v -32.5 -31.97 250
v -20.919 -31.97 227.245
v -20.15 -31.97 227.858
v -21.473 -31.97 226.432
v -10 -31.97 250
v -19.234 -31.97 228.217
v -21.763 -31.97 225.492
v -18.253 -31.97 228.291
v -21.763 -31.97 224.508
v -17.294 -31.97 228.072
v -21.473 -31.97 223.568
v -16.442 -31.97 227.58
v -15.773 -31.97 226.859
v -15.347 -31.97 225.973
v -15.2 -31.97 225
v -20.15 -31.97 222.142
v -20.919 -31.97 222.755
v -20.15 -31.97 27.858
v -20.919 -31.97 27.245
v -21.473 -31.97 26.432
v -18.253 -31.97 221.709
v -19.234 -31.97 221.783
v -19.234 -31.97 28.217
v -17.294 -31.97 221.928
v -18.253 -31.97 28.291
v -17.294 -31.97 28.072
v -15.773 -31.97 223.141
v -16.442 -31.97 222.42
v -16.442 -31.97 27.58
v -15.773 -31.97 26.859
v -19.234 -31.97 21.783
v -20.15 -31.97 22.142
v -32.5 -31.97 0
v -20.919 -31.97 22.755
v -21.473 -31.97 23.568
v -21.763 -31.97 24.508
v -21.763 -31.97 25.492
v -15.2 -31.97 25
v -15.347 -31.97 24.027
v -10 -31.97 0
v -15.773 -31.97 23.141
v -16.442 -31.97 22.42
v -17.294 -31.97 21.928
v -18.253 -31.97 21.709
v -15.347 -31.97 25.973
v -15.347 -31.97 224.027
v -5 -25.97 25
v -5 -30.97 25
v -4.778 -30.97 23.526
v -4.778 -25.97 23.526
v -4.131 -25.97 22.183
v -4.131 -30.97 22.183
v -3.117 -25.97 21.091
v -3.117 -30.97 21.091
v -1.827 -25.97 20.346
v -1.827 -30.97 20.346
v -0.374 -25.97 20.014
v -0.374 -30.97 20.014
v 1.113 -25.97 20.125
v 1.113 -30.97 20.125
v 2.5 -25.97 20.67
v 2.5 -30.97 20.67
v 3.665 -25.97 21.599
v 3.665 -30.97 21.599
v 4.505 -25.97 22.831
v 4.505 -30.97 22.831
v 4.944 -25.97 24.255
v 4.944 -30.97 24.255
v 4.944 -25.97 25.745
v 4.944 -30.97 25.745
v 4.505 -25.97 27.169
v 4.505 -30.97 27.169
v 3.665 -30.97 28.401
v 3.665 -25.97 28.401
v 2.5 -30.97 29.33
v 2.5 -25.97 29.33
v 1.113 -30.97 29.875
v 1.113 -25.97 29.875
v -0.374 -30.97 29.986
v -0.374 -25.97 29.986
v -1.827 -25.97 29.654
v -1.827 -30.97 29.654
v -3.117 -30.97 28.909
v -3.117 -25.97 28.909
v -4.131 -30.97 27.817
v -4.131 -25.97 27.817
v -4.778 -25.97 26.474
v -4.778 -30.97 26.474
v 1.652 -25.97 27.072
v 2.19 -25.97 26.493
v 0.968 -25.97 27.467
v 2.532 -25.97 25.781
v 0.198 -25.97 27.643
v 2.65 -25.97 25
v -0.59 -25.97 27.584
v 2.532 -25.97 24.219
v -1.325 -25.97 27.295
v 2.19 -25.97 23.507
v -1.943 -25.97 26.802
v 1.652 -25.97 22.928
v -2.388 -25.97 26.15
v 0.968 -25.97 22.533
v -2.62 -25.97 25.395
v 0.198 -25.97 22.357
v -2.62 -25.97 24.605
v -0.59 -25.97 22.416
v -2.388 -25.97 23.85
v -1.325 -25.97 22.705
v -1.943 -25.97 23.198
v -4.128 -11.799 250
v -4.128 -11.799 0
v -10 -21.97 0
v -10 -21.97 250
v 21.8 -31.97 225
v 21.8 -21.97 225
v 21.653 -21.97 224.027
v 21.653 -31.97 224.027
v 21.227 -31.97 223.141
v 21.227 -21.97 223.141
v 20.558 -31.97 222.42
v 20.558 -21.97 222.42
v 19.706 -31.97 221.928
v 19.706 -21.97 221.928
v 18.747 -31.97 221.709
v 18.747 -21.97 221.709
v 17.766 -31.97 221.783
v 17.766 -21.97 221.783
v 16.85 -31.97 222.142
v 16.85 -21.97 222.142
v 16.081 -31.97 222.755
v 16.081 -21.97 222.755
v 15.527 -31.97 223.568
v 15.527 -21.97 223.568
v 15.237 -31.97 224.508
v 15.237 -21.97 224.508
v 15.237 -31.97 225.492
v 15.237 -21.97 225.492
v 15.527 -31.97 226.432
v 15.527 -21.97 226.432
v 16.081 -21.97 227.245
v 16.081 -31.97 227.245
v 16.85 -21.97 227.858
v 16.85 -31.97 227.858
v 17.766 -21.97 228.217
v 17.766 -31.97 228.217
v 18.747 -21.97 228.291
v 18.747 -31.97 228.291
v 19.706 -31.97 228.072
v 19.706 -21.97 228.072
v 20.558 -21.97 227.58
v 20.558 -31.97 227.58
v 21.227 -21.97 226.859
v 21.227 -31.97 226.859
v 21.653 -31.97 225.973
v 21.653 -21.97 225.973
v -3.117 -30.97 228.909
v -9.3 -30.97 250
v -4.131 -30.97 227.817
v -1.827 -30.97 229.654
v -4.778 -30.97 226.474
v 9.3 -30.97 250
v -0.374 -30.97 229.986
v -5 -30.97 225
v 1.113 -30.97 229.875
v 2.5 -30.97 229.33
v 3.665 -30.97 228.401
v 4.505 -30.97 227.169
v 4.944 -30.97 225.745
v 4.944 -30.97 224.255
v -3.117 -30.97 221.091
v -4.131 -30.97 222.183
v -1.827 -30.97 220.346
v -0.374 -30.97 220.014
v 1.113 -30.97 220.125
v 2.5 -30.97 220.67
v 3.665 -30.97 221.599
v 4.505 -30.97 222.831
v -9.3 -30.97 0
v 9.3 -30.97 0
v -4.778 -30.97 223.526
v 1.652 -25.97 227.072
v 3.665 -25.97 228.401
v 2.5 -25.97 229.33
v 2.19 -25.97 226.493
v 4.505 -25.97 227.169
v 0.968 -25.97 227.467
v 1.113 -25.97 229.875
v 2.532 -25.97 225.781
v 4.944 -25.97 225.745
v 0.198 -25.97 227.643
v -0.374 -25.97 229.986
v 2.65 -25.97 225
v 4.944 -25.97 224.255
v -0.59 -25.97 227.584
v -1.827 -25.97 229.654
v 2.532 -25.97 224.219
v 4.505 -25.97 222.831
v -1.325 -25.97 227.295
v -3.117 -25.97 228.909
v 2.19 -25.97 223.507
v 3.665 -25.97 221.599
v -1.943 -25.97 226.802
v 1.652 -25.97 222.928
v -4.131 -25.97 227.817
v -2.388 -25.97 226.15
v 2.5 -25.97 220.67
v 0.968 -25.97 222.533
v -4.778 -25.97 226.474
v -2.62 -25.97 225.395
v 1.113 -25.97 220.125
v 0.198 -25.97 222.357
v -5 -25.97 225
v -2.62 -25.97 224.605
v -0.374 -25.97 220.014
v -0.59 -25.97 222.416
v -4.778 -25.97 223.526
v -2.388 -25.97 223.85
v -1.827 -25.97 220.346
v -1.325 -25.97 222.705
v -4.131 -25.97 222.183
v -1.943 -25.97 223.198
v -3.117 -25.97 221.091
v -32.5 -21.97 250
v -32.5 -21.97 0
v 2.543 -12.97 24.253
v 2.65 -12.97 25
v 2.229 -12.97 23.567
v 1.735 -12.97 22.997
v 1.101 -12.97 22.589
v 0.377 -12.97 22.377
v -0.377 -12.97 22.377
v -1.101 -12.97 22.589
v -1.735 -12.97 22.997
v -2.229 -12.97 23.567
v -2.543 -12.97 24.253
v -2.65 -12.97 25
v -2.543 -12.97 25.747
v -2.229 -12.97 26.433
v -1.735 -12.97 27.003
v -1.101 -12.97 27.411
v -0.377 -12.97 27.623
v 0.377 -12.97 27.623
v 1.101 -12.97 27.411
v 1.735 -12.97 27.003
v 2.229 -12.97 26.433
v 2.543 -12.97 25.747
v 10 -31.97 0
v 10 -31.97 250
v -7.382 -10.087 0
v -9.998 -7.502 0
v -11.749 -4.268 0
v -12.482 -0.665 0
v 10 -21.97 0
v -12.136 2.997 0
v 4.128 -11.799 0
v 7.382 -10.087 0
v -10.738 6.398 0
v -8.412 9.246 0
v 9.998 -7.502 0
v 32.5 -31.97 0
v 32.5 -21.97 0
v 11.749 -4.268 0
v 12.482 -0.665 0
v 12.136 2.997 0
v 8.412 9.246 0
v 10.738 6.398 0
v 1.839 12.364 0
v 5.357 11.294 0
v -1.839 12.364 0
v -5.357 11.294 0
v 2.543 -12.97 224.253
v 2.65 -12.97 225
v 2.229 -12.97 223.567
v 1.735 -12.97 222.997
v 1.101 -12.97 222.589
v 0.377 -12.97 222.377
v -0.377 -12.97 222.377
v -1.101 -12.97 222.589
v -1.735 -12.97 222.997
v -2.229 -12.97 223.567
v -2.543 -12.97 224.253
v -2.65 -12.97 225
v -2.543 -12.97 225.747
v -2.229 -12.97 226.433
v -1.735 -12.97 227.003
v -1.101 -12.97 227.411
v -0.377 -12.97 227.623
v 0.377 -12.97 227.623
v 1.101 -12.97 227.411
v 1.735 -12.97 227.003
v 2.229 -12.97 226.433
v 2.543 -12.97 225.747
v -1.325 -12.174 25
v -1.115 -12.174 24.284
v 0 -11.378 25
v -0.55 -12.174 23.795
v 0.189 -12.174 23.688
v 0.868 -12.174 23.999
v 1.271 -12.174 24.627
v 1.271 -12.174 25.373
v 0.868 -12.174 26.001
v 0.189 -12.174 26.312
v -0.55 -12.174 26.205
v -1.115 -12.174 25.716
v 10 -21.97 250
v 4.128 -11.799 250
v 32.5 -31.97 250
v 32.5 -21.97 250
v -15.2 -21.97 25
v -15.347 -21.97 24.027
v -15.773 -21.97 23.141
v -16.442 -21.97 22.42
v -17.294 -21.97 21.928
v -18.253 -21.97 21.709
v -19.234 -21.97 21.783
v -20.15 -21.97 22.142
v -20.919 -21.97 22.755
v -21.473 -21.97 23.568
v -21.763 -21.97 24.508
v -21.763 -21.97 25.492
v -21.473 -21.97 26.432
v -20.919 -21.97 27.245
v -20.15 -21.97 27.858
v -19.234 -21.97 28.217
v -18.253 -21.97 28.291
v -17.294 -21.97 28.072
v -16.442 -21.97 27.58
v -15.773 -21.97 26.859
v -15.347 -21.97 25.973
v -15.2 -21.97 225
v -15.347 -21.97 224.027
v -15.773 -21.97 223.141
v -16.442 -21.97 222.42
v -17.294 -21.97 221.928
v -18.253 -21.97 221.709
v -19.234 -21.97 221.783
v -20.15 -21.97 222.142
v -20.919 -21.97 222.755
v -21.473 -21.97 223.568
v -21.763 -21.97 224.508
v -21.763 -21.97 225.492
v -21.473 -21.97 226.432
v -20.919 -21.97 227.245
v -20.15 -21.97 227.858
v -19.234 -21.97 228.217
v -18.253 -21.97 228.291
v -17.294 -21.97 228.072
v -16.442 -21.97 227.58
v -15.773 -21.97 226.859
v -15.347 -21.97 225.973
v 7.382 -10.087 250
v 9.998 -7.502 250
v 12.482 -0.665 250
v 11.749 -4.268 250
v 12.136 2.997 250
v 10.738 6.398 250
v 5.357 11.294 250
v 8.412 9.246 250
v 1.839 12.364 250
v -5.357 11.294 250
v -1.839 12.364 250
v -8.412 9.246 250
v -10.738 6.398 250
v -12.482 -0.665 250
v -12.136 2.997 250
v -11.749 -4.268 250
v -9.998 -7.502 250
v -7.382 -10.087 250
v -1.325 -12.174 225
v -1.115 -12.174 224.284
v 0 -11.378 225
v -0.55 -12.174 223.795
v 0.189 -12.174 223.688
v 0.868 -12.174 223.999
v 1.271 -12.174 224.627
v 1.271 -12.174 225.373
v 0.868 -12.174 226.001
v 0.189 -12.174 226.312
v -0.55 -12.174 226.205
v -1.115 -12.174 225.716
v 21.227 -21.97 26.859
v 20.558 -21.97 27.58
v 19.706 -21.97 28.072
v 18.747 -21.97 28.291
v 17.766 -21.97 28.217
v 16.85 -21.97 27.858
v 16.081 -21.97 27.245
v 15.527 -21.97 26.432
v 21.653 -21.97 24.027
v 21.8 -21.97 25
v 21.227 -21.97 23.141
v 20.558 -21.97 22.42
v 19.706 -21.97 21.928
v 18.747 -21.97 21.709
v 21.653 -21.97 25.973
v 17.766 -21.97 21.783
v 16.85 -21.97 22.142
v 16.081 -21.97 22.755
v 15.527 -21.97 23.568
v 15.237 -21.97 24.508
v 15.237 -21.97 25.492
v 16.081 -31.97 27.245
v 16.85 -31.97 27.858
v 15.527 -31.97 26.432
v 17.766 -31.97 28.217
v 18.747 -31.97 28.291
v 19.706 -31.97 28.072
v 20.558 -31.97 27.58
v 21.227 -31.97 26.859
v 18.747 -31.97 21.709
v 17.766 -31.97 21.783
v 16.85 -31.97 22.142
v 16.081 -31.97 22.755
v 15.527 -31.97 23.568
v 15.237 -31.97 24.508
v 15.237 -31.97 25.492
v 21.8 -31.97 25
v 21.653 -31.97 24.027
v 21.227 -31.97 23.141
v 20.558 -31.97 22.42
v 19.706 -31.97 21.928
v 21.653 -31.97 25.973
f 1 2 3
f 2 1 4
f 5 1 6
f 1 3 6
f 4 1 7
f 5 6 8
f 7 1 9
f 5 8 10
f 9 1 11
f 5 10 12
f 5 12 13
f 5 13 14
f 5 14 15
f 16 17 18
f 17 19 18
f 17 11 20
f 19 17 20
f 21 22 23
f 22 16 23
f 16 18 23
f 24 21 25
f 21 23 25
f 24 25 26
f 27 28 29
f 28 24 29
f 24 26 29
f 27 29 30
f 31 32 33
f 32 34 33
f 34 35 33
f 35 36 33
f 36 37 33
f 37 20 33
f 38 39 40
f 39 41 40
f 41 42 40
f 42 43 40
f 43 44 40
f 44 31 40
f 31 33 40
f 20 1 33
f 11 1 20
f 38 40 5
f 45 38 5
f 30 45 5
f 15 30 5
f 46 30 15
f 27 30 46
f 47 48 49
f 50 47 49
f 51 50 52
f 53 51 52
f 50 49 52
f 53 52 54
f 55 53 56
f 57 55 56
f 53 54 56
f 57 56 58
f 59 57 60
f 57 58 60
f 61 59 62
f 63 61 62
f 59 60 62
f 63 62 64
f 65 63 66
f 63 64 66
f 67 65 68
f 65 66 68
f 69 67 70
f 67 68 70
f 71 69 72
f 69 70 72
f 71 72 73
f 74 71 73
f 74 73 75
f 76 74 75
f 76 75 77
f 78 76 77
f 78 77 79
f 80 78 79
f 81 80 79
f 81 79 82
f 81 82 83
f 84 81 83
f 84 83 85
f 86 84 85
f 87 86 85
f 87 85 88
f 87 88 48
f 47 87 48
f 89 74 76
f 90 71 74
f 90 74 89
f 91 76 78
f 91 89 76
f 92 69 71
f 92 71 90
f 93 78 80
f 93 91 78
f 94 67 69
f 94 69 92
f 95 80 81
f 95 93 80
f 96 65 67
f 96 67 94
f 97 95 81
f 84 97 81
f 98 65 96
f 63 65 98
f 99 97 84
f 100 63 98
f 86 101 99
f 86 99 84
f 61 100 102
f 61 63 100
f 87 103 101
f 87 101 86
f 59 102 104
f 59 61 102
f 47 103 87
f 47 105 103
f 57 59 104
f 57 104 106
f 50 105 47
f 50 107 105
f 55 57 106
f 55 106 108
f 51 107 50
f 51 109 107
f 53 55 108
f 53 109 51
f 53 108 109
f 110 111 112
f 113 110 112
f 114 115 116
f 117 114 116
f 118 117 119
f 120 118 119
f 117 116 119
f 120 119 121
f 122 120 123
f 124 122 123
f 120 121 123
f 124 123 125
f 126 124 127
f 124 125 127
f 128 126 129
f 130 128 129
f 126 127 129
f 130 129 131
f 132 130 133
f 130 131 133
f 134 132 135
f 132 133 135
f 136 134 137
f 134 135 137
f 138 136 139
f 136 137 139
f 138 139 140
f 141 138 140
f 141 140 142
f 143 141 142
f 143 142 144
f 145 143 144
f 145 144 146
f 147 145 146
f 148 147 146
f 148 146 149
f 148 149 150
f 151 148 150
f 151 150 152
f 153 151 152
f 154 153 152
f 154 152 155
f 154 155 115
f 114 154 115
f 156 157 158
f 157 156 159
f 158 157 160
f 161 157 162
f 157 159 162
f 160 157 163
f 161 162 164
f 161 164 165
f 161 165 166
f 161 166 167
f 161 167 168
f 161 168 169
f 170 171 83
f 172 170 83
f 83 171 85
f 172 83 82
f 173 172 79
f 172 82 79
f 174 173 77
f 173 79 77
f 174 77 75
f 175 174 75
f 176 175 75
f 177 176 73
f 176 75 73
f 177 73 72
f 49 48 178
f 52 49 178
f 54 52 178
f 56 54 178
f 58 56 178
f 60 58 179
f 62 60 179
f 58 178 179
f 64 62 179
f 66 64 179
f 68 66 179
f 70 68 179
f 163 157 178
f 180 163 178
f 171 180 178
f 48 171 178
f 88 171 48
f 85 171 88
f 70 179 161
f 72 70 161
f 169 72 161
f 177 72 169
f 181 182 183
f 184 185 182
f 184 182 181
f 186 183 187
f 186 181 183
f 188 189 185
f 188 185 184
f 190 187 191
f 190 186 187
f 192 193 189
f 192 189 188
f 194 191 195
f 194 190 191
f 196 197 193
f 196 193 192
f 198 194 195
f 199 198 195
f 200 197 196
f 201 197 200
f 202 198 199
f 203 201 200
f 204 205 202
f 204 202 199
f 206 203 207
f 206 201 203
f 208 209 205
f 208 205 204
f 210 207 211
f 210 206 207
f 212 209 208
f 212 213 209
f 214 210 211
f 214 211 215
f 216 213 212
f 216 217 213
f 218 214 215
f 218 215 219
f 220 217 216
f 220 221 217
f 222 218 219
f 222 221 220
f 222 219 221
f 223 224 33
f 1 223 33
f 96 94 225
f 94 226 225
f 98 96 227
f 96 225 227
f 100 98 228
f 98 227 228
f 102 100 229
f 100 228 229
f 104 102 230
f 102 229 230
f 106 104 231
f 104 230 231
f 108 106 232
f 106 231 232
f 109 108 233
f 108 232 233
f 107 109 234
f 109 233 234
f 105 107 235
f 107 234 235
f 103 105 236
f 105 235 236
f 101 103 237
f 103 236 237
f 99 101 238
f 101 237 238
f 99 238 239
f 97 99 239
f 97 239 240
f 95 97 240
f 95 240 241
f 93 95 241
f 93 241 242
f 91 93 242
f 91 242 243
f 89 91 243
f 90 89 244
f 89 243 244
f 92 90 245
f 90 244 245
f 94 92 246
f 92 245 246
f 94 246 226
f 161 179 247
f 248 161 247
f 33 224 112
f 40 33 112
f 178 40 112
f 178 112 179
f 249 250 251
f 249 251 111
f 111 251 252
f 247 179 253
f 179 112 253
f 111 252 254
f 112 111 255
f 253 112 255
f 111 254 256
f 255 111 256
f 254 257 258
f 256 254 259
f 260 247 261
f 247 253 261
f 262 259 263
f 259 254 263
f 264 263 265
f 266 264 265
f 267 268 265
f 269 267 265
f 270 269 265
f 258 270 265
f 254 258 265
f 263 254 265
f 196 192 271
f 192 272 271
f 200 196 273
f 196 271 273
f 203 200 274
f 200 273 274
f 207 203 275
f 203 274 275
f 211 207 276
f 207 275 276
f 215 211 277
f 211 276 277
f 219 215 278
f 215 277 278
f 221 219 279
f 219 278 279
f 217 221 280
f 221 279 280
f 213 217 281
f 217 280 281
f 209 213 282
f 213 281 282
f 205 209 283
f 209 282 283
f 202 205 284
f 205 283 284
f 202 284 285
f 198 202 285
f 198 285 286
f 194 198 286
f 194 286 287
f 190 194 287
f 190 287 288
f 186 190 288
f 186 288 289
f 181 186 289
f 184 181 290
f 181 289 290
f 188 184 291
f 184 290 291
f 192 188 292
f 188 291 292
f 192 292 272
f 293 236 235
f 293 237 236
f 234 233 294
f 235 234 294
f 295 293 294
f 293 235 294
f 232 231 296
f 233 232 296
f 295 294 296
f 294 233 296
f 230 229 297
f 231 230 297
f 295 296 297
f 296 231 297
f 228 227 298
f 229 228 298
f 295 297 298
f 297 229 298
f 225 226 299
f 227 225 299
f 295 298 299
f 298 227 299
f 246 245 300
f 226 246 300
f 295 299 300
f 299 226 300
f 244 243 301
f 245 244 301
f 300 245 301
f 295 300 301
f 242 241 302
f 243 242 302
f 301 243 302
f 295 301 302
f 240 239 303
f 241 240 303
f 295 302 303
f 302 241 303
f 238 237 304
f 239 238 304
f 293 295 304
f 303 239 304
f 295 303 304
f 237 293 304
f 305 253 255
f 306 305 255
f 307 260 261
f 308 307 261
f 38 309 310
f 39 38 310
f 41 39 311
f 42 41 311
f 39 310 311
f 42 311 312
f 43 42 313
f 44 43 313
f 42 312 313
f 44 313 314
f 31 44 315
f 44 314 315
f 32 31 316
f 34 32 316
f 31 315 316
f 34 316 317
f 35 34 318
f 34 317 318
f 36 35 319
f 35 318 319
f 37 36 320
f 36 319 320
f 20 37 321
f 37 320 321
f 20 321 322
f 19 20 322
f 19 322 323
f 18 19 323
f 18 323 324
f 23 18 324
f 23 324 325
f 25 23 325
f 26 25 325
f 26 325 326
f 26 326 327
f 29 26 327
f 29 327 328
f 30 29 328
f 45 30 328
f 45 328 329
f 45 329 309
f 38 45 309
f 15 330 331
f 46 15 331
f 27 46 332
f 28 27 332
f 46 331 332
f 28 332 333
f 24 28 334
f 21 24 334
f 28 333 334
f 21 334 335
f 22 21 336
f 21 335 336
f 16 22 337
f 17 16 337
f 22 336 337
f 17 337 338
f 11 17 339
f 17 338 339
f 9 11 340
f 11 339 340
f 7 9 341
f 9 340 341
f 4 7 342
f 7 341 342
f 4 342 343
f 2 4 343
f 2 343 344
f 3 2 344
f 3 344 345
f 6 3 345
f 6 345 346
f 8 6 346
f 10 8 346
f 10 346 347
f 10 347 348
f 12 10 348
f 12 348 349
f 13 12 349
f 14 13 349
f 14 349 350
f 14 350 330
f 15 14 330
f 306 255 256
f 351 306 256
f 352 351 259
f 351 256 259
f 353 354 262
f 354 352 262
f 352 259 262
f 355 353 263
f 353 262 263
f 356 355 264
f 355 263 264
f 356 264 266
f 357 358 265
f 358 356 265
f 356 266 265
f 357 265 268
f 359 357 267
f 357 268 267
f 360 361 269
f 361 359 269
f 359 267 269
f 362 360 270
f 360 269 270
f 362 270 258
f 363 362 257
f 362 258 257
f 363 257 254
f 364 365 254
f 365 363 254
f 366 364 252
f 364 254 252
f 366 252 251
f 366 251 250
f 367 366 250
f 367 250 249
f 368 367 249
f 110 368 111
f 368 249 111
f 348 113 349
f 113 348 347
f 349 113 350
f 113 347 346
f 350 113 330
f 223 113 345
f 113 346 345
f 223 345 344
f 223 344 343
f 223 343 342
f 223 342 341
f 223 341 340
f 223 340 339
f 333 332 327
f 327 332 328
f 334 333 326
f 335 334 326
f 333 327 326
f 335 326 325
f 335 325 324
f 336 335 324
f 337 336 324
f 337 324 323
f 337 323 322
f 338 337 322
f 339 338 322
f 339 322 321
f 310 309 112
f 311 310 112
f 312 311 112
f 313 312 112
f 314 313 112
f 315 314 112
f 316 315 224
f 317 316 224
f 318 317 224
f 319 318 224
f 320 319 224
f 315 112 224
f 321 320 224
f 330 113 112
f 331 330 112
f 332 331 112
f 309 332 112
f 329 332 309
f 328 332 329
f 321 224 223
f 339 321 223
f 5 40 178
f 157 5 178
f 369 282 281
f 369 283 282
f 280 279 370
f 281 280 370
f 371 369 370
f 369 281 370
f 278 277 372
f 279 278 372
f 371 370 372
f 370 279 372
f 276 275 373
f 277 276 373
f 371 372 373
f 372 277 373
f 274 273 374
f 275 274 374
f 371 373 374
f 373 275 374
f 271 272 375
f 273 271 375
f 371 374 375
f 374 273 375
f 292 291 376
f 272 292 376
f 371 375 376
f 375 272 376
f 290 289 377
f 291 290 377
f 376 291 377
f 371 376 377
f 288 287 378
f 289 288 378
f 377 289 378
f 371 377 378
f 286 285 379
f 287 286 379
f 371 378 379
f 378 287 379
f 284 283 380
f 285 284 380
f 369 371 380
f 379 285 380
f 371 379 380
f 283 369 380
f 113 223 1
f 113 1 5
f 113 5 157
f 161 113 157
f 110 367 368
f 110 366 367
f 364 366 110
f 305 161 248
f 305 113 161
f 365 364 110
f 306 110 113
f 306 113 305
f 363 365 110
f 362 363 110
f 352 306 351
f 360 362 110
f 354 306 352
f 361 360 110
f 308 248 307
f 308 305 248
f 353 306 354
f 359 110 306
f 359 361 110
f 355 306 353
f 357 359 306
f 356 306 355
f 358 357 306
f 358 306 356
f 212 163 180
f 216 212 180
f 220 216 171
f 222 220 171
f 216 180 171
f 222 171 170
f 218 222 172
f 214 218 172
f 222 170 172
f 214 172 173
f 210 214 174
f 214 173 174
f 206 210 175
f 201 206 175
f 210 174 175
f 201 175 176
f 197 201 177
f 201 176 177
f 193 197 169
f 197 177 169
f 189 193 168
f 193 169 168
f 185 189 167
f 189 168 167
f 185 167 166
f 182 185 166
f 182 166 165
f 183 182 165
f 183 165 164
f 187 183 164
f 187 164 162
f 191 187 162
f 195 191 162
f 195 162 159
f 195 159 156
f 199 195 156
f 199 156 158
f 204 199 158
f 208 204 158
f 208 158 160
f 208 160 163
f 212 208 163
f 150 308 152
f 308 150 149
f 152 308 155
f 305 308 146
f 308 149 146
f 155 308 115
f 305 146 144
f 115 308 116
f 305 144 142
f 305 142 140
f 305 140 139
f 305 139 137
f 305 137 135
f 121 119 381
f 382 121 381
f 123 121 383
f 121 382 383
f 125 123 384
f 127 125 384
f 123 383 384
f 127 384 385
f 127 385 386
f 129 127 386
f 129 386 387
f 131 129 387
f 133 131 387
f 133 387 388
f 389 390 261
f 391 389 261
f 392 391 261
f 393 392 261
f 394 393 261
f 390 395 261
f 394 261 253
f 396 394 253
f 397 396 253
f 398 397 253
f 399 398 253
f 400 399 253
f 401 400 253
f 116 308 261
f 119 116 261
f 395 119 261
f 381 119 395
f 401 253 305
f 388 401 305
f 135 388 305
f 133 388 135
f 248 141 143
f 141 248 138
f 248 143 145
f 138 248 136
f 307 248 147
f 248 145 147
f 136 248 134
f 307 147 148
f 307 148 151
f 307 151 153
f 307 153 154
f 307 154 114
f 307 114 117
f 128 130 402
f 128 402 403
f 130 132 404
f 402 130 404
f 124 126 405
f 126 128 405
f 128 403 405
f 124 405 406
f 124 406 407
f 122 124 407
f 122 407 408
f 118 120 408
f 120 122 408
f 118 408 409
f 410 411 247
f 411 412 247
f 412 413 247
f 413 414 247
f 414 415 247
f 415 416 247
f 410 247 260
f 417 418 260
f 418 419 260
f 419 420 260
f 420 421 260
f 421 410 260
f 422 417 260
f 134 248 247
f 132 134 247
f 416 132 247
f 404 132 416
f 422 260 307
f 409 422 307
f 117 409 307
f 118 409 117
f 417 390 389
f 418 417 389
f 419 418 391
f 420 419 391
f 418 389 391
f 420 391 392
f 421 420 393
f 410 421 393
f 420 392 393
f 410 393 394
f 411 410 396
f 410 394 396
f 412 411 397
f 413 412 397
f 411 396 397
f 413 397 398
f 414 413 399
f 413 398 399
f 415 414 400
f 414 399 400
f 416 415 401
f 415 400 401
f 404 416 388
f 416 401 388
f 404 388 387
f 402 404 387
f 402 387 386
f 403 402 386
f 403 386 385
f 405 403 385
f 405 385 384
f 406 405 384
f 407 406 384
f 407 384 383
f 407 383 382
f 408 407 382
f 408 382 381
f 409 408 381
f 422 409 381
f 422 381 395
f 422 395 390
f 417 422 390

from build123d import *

# Parameters (mm, degrees)
SKETCH_2_R                  = 12.5
EXTRUDE_2_DEPTH             = 250
EXTRUDE_3_DEPTH             = 250
SKETCH_7_R                  = 3.3
CUT_EXTRUDE_1_DEPTH         = 11
HOLE_WIZARD_M51_D           = 5.3
HOLE_WIZARD_M51_DEPTH       = 18
HOLE_WIZARD_M51_CBORE_D     = 10
HOLE_WIZARD_M51_CBORE_DEPTH = 5
HOLE_WIZARD_M51_TIP         = 1.59228064


with BuildPart() as part:
    # Эскиз2 → Бобышка-Вытянуть2 (new body)
    with BuildSketch(Plane.XY):
        Circle(SKETCH_2_R)
    extrude(amount=EXTRUDE_2_DEPTH)

    # Эскиз2<4> → Бобышка-Вытянуть3 (add)
    with BuildSketch(Plane.XY):
        with BuildLine():
            Line((10, -21.97), (4.127670885, -11.798827614))
            ThreePointArc((4.127670885, -11.798827614), (0, -12.5), (-4.127670885, -11.798827614))
            Line((-4.127670885, -11.798827614), (-10, -21.97))
            Line((-10, -21.97), (-32.5, -21.97))
            Line((-32.5, -21.97), (-32.5, -31.97))
            Line((-32.5, -31.97), (-10, -31.97))
            Line((-10, -31.97), (-9.299792462, -30.97))
            Line((-9.299792462, -30.97), (9.299792462, -30.97))
            Line((9.299792462, -30.97), (10, -31.97))
            Line((10, -31.97), (32.5, -31.97))
            Line((32.5, -31.97), (32.5, -21.97))
            Line((32.5, -21.97), (10, -21.97))
        make_face()
    extrude(amount=EXTRUDE_3_DEPTH)

    # Эскиз7 → Вырез-Вытянуть1 (cut, through all)
    with BuildSketch(Plane(origin=(0, -21.97, 0), x_dir=(1, 0, 0), z_dir=(0, 1, 0))):
        with Locations((-18.5, -225)):
            Circle(SKETCH_7_R)
        with Locations((18.5, -225)):
            Circle(SKETCH_7_R)
        with Locations((18.5, -25)):
            Circle(SKETCH_7_R)
        with Locations((-18.5, -25)):
            Circle(SKETCH_7_R)
    extrude(amount=-CUT_EXTRUDE_1_DEPTH, mode=Mode.SUBTRACT)

    # Цековка для винта с внутренним шестигранником M51
    with Locations(Plane(origin=(0, -30.97, 0), x_dir=(-1, 0, 0), z_dir=(0, -1, 0))):
        with Locations((0, -25), (0, -225)):
            CounterBoreHole(HOLE_WIZARD_M51_D / 2, HOLE_WIZARD_M51_CBORE_D / 2, HOLE_WIZARD_M51_CBORE_DEPTH, depth=HOLE_WIZARD_M51_DEPTH)
            with Locations((0, 0, -(HOLE_WIZARD_M51_DEPTH + HOLE_WIZARD_M51_TIP / 2))):  # 118° drill point
                Cone(0, HOLE_WIZARD_M51_D / 2, HOLE_WIZARD_M51_TIP, mode=Mode.SUBTRACT)


solid = part.part
